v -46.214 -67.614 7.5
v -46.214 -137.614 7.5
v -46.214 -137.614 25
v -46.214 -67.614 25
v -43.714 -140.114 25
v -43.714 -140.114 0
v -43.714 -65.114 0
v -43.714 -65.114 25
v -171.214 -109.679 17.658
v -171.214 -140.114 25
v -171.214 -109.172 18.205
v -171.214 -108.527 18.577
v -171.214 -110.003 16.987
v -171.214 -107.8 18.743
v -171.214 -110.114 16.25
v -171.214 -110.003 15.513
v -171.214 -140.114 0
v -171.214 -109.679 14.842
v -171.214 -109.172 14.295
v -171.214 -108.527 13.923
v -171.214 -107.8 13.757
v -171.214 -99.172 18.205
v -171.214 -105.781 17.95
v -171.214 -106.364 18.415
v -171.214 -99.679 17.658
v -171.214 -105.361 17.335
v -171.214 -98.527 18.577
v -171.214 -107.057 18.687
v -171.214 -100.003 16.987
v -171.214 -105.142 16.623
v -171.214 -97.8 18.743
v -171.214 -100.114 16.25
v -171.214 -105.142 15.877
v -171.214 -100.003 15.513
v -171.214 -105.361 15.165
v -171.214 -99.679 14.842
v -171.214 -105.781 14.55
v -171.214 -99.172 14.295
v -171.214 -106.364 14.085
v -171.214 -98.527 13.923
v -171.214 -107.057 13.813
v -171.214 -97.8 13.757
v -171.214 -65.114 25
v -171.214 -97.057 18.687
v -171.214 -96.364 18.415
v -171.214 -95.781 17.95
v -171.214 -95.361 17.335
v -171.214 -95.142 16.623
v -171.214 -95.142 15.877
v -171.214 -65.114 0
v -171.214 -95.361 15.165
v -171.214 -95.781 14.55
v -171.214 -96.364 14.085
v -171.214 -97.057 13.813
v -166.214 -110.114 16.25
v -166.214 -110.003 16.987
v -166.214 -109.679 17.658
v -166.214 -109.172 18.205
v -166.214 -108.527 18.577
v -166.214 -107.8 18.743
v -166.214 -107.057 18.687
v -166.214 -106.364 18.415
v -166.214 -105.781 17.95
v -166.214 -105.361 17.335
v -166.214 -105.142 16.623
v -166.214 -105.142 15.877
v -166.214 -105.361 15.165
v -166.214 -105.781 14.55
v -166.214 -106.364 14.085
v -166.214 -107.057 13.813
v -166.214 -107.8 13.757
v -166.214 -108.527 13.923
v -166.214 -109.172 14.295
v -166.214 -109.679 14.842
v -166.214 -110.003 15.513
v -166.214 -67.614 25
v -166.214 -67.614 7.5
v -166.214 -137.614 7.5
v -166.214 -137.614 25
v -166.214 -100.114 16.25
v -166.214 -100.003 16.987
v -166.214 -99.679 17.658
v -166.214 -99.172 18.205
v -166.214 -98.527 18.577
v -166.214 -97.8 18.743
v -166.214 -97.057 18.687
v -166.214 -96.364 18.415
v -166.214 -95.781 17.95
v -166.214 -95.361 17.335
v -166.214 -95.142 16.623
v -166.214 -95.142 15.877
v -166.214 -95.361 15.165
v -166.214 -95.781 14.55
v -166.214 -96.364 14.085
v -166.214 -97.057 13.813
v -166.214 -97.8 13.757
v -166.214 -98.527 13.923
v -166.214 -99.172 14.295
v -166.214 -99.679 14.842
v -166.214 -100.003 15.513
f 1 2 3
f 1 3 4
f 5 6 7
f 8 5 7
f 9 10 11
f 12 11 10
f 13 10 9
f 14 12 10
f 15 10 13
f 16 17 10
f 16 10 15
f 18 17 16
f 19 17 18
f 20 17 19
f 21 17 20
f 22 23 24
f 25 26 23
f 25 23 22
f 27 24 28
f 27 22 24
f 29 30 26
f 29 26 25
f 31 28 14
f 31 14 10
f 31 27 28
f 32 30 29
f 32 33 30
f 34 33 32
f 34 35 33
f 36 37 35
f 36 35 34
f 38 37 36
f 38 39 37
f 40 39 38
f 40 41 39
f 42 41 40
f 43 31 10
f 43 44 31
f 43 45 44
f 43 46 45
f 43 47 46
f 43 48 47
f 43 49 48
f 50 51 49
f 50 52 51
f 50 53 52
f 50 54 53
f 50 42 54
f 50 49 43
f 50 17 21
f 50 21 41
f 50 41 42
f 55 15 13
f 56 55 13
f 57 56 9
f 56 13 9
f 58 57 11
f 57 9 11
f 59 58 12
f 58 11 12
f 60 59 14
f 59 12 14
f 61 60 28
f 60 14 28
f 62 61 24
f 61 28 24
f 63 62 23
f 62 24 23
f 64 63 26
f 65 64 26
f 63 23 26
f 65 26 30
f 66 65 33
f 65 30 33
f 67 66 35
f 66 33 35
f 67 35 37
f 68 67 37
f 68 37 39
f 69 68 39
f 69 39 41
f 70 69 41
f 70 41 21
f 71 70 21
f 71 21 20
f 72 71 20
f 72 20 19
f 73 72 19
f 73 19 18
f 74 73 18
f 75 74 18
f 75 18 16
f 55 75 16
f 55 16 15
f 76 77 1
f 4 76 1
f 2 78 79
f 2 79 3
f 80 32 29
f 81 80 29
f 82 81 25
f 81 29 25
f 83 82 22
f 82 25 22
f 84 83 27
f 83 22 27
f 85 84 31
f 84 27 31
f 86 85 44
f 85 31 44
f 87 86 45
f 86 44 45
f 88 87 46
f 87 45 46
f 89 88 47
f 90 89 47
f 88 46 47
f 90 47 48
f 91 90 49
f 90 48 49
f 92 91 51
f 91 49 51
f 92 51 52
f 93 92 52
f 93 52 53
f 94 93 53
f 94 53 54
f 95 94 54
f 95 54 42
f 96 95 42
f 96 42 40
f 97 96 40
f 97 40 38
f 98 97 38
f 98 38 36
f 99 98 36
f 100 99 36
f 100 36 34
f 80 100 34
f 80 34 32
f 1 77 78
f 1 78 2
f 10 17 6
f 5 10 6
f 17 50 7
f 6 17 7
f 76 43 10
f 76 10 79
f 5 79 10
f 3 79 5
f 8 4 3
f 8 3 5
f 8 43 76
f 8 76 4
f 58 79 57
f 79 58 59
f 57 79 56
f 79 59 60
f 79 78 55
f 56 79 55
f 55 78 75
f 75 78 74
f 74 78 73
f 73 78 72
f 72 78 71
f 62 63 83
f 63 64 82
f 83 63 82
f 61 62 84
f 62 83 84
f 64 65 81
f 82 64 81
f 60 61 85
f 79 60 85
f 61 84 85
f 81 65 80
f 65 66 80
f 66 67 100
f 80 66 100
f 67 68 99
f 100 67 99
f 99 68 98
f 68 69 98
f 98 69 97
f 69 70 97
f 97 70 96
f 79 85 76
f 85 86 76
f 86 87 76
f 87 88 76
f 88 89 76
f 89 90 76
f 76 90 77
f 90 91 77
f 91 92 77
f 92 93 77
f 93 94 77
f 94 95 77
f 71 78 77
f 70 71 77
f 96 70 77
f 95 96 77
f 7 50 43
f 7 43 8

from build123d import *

# Parameters (mm, degrees)
F0_W     = 127.5
F0_H     = 75
F0_W_2   = 120
F0_H_2   = 70
F1_DEPTH = 25
F2_W     = 120
F2_H     = 7.5
F3_DEPTH = 70
F4_R     = 2.5
F5_DEPTH = 25


with BuildPart() as f1:
    # F0 (on Top) → F1 (new body)
    with BuildSketch(Plane.XY):
        with Locations((-107.463835, -102.613583)):
            Rectangle(F0_W, F0_H)
        with Locations((-106.213835, -102.613583)):
            Rectangle(F0_W_2, F0_H_2, mode=Mode.SUBTRACT)
    extrude(amount=F1_DEPTH)

    # F2 (on face) → F3 (join)
    with BuildSketch(Plane.XZ.offset(67.613583)):
        with Locations((-106.213835, 3.75)):
            Rectangle(F2_W, F2_H)
    extrude(amount=F3_DEPTH)

    # F4 (on face) → F5 (cut)
    with BuildSketch(Plane(origin=(-171.213835, 0, 0), x_dir=(0, -1, 0), z_dir=(-1, 0, 0))):
        with Locations((97.613583, 16.25)):
            Circle(F4_R)
        with Locations((107.613583, 16.25)):
            Circle(F4_R)
    extrude(amount=-F5_DEPTH, mode=Mode.SUBTRACT)


solid = f1.part
